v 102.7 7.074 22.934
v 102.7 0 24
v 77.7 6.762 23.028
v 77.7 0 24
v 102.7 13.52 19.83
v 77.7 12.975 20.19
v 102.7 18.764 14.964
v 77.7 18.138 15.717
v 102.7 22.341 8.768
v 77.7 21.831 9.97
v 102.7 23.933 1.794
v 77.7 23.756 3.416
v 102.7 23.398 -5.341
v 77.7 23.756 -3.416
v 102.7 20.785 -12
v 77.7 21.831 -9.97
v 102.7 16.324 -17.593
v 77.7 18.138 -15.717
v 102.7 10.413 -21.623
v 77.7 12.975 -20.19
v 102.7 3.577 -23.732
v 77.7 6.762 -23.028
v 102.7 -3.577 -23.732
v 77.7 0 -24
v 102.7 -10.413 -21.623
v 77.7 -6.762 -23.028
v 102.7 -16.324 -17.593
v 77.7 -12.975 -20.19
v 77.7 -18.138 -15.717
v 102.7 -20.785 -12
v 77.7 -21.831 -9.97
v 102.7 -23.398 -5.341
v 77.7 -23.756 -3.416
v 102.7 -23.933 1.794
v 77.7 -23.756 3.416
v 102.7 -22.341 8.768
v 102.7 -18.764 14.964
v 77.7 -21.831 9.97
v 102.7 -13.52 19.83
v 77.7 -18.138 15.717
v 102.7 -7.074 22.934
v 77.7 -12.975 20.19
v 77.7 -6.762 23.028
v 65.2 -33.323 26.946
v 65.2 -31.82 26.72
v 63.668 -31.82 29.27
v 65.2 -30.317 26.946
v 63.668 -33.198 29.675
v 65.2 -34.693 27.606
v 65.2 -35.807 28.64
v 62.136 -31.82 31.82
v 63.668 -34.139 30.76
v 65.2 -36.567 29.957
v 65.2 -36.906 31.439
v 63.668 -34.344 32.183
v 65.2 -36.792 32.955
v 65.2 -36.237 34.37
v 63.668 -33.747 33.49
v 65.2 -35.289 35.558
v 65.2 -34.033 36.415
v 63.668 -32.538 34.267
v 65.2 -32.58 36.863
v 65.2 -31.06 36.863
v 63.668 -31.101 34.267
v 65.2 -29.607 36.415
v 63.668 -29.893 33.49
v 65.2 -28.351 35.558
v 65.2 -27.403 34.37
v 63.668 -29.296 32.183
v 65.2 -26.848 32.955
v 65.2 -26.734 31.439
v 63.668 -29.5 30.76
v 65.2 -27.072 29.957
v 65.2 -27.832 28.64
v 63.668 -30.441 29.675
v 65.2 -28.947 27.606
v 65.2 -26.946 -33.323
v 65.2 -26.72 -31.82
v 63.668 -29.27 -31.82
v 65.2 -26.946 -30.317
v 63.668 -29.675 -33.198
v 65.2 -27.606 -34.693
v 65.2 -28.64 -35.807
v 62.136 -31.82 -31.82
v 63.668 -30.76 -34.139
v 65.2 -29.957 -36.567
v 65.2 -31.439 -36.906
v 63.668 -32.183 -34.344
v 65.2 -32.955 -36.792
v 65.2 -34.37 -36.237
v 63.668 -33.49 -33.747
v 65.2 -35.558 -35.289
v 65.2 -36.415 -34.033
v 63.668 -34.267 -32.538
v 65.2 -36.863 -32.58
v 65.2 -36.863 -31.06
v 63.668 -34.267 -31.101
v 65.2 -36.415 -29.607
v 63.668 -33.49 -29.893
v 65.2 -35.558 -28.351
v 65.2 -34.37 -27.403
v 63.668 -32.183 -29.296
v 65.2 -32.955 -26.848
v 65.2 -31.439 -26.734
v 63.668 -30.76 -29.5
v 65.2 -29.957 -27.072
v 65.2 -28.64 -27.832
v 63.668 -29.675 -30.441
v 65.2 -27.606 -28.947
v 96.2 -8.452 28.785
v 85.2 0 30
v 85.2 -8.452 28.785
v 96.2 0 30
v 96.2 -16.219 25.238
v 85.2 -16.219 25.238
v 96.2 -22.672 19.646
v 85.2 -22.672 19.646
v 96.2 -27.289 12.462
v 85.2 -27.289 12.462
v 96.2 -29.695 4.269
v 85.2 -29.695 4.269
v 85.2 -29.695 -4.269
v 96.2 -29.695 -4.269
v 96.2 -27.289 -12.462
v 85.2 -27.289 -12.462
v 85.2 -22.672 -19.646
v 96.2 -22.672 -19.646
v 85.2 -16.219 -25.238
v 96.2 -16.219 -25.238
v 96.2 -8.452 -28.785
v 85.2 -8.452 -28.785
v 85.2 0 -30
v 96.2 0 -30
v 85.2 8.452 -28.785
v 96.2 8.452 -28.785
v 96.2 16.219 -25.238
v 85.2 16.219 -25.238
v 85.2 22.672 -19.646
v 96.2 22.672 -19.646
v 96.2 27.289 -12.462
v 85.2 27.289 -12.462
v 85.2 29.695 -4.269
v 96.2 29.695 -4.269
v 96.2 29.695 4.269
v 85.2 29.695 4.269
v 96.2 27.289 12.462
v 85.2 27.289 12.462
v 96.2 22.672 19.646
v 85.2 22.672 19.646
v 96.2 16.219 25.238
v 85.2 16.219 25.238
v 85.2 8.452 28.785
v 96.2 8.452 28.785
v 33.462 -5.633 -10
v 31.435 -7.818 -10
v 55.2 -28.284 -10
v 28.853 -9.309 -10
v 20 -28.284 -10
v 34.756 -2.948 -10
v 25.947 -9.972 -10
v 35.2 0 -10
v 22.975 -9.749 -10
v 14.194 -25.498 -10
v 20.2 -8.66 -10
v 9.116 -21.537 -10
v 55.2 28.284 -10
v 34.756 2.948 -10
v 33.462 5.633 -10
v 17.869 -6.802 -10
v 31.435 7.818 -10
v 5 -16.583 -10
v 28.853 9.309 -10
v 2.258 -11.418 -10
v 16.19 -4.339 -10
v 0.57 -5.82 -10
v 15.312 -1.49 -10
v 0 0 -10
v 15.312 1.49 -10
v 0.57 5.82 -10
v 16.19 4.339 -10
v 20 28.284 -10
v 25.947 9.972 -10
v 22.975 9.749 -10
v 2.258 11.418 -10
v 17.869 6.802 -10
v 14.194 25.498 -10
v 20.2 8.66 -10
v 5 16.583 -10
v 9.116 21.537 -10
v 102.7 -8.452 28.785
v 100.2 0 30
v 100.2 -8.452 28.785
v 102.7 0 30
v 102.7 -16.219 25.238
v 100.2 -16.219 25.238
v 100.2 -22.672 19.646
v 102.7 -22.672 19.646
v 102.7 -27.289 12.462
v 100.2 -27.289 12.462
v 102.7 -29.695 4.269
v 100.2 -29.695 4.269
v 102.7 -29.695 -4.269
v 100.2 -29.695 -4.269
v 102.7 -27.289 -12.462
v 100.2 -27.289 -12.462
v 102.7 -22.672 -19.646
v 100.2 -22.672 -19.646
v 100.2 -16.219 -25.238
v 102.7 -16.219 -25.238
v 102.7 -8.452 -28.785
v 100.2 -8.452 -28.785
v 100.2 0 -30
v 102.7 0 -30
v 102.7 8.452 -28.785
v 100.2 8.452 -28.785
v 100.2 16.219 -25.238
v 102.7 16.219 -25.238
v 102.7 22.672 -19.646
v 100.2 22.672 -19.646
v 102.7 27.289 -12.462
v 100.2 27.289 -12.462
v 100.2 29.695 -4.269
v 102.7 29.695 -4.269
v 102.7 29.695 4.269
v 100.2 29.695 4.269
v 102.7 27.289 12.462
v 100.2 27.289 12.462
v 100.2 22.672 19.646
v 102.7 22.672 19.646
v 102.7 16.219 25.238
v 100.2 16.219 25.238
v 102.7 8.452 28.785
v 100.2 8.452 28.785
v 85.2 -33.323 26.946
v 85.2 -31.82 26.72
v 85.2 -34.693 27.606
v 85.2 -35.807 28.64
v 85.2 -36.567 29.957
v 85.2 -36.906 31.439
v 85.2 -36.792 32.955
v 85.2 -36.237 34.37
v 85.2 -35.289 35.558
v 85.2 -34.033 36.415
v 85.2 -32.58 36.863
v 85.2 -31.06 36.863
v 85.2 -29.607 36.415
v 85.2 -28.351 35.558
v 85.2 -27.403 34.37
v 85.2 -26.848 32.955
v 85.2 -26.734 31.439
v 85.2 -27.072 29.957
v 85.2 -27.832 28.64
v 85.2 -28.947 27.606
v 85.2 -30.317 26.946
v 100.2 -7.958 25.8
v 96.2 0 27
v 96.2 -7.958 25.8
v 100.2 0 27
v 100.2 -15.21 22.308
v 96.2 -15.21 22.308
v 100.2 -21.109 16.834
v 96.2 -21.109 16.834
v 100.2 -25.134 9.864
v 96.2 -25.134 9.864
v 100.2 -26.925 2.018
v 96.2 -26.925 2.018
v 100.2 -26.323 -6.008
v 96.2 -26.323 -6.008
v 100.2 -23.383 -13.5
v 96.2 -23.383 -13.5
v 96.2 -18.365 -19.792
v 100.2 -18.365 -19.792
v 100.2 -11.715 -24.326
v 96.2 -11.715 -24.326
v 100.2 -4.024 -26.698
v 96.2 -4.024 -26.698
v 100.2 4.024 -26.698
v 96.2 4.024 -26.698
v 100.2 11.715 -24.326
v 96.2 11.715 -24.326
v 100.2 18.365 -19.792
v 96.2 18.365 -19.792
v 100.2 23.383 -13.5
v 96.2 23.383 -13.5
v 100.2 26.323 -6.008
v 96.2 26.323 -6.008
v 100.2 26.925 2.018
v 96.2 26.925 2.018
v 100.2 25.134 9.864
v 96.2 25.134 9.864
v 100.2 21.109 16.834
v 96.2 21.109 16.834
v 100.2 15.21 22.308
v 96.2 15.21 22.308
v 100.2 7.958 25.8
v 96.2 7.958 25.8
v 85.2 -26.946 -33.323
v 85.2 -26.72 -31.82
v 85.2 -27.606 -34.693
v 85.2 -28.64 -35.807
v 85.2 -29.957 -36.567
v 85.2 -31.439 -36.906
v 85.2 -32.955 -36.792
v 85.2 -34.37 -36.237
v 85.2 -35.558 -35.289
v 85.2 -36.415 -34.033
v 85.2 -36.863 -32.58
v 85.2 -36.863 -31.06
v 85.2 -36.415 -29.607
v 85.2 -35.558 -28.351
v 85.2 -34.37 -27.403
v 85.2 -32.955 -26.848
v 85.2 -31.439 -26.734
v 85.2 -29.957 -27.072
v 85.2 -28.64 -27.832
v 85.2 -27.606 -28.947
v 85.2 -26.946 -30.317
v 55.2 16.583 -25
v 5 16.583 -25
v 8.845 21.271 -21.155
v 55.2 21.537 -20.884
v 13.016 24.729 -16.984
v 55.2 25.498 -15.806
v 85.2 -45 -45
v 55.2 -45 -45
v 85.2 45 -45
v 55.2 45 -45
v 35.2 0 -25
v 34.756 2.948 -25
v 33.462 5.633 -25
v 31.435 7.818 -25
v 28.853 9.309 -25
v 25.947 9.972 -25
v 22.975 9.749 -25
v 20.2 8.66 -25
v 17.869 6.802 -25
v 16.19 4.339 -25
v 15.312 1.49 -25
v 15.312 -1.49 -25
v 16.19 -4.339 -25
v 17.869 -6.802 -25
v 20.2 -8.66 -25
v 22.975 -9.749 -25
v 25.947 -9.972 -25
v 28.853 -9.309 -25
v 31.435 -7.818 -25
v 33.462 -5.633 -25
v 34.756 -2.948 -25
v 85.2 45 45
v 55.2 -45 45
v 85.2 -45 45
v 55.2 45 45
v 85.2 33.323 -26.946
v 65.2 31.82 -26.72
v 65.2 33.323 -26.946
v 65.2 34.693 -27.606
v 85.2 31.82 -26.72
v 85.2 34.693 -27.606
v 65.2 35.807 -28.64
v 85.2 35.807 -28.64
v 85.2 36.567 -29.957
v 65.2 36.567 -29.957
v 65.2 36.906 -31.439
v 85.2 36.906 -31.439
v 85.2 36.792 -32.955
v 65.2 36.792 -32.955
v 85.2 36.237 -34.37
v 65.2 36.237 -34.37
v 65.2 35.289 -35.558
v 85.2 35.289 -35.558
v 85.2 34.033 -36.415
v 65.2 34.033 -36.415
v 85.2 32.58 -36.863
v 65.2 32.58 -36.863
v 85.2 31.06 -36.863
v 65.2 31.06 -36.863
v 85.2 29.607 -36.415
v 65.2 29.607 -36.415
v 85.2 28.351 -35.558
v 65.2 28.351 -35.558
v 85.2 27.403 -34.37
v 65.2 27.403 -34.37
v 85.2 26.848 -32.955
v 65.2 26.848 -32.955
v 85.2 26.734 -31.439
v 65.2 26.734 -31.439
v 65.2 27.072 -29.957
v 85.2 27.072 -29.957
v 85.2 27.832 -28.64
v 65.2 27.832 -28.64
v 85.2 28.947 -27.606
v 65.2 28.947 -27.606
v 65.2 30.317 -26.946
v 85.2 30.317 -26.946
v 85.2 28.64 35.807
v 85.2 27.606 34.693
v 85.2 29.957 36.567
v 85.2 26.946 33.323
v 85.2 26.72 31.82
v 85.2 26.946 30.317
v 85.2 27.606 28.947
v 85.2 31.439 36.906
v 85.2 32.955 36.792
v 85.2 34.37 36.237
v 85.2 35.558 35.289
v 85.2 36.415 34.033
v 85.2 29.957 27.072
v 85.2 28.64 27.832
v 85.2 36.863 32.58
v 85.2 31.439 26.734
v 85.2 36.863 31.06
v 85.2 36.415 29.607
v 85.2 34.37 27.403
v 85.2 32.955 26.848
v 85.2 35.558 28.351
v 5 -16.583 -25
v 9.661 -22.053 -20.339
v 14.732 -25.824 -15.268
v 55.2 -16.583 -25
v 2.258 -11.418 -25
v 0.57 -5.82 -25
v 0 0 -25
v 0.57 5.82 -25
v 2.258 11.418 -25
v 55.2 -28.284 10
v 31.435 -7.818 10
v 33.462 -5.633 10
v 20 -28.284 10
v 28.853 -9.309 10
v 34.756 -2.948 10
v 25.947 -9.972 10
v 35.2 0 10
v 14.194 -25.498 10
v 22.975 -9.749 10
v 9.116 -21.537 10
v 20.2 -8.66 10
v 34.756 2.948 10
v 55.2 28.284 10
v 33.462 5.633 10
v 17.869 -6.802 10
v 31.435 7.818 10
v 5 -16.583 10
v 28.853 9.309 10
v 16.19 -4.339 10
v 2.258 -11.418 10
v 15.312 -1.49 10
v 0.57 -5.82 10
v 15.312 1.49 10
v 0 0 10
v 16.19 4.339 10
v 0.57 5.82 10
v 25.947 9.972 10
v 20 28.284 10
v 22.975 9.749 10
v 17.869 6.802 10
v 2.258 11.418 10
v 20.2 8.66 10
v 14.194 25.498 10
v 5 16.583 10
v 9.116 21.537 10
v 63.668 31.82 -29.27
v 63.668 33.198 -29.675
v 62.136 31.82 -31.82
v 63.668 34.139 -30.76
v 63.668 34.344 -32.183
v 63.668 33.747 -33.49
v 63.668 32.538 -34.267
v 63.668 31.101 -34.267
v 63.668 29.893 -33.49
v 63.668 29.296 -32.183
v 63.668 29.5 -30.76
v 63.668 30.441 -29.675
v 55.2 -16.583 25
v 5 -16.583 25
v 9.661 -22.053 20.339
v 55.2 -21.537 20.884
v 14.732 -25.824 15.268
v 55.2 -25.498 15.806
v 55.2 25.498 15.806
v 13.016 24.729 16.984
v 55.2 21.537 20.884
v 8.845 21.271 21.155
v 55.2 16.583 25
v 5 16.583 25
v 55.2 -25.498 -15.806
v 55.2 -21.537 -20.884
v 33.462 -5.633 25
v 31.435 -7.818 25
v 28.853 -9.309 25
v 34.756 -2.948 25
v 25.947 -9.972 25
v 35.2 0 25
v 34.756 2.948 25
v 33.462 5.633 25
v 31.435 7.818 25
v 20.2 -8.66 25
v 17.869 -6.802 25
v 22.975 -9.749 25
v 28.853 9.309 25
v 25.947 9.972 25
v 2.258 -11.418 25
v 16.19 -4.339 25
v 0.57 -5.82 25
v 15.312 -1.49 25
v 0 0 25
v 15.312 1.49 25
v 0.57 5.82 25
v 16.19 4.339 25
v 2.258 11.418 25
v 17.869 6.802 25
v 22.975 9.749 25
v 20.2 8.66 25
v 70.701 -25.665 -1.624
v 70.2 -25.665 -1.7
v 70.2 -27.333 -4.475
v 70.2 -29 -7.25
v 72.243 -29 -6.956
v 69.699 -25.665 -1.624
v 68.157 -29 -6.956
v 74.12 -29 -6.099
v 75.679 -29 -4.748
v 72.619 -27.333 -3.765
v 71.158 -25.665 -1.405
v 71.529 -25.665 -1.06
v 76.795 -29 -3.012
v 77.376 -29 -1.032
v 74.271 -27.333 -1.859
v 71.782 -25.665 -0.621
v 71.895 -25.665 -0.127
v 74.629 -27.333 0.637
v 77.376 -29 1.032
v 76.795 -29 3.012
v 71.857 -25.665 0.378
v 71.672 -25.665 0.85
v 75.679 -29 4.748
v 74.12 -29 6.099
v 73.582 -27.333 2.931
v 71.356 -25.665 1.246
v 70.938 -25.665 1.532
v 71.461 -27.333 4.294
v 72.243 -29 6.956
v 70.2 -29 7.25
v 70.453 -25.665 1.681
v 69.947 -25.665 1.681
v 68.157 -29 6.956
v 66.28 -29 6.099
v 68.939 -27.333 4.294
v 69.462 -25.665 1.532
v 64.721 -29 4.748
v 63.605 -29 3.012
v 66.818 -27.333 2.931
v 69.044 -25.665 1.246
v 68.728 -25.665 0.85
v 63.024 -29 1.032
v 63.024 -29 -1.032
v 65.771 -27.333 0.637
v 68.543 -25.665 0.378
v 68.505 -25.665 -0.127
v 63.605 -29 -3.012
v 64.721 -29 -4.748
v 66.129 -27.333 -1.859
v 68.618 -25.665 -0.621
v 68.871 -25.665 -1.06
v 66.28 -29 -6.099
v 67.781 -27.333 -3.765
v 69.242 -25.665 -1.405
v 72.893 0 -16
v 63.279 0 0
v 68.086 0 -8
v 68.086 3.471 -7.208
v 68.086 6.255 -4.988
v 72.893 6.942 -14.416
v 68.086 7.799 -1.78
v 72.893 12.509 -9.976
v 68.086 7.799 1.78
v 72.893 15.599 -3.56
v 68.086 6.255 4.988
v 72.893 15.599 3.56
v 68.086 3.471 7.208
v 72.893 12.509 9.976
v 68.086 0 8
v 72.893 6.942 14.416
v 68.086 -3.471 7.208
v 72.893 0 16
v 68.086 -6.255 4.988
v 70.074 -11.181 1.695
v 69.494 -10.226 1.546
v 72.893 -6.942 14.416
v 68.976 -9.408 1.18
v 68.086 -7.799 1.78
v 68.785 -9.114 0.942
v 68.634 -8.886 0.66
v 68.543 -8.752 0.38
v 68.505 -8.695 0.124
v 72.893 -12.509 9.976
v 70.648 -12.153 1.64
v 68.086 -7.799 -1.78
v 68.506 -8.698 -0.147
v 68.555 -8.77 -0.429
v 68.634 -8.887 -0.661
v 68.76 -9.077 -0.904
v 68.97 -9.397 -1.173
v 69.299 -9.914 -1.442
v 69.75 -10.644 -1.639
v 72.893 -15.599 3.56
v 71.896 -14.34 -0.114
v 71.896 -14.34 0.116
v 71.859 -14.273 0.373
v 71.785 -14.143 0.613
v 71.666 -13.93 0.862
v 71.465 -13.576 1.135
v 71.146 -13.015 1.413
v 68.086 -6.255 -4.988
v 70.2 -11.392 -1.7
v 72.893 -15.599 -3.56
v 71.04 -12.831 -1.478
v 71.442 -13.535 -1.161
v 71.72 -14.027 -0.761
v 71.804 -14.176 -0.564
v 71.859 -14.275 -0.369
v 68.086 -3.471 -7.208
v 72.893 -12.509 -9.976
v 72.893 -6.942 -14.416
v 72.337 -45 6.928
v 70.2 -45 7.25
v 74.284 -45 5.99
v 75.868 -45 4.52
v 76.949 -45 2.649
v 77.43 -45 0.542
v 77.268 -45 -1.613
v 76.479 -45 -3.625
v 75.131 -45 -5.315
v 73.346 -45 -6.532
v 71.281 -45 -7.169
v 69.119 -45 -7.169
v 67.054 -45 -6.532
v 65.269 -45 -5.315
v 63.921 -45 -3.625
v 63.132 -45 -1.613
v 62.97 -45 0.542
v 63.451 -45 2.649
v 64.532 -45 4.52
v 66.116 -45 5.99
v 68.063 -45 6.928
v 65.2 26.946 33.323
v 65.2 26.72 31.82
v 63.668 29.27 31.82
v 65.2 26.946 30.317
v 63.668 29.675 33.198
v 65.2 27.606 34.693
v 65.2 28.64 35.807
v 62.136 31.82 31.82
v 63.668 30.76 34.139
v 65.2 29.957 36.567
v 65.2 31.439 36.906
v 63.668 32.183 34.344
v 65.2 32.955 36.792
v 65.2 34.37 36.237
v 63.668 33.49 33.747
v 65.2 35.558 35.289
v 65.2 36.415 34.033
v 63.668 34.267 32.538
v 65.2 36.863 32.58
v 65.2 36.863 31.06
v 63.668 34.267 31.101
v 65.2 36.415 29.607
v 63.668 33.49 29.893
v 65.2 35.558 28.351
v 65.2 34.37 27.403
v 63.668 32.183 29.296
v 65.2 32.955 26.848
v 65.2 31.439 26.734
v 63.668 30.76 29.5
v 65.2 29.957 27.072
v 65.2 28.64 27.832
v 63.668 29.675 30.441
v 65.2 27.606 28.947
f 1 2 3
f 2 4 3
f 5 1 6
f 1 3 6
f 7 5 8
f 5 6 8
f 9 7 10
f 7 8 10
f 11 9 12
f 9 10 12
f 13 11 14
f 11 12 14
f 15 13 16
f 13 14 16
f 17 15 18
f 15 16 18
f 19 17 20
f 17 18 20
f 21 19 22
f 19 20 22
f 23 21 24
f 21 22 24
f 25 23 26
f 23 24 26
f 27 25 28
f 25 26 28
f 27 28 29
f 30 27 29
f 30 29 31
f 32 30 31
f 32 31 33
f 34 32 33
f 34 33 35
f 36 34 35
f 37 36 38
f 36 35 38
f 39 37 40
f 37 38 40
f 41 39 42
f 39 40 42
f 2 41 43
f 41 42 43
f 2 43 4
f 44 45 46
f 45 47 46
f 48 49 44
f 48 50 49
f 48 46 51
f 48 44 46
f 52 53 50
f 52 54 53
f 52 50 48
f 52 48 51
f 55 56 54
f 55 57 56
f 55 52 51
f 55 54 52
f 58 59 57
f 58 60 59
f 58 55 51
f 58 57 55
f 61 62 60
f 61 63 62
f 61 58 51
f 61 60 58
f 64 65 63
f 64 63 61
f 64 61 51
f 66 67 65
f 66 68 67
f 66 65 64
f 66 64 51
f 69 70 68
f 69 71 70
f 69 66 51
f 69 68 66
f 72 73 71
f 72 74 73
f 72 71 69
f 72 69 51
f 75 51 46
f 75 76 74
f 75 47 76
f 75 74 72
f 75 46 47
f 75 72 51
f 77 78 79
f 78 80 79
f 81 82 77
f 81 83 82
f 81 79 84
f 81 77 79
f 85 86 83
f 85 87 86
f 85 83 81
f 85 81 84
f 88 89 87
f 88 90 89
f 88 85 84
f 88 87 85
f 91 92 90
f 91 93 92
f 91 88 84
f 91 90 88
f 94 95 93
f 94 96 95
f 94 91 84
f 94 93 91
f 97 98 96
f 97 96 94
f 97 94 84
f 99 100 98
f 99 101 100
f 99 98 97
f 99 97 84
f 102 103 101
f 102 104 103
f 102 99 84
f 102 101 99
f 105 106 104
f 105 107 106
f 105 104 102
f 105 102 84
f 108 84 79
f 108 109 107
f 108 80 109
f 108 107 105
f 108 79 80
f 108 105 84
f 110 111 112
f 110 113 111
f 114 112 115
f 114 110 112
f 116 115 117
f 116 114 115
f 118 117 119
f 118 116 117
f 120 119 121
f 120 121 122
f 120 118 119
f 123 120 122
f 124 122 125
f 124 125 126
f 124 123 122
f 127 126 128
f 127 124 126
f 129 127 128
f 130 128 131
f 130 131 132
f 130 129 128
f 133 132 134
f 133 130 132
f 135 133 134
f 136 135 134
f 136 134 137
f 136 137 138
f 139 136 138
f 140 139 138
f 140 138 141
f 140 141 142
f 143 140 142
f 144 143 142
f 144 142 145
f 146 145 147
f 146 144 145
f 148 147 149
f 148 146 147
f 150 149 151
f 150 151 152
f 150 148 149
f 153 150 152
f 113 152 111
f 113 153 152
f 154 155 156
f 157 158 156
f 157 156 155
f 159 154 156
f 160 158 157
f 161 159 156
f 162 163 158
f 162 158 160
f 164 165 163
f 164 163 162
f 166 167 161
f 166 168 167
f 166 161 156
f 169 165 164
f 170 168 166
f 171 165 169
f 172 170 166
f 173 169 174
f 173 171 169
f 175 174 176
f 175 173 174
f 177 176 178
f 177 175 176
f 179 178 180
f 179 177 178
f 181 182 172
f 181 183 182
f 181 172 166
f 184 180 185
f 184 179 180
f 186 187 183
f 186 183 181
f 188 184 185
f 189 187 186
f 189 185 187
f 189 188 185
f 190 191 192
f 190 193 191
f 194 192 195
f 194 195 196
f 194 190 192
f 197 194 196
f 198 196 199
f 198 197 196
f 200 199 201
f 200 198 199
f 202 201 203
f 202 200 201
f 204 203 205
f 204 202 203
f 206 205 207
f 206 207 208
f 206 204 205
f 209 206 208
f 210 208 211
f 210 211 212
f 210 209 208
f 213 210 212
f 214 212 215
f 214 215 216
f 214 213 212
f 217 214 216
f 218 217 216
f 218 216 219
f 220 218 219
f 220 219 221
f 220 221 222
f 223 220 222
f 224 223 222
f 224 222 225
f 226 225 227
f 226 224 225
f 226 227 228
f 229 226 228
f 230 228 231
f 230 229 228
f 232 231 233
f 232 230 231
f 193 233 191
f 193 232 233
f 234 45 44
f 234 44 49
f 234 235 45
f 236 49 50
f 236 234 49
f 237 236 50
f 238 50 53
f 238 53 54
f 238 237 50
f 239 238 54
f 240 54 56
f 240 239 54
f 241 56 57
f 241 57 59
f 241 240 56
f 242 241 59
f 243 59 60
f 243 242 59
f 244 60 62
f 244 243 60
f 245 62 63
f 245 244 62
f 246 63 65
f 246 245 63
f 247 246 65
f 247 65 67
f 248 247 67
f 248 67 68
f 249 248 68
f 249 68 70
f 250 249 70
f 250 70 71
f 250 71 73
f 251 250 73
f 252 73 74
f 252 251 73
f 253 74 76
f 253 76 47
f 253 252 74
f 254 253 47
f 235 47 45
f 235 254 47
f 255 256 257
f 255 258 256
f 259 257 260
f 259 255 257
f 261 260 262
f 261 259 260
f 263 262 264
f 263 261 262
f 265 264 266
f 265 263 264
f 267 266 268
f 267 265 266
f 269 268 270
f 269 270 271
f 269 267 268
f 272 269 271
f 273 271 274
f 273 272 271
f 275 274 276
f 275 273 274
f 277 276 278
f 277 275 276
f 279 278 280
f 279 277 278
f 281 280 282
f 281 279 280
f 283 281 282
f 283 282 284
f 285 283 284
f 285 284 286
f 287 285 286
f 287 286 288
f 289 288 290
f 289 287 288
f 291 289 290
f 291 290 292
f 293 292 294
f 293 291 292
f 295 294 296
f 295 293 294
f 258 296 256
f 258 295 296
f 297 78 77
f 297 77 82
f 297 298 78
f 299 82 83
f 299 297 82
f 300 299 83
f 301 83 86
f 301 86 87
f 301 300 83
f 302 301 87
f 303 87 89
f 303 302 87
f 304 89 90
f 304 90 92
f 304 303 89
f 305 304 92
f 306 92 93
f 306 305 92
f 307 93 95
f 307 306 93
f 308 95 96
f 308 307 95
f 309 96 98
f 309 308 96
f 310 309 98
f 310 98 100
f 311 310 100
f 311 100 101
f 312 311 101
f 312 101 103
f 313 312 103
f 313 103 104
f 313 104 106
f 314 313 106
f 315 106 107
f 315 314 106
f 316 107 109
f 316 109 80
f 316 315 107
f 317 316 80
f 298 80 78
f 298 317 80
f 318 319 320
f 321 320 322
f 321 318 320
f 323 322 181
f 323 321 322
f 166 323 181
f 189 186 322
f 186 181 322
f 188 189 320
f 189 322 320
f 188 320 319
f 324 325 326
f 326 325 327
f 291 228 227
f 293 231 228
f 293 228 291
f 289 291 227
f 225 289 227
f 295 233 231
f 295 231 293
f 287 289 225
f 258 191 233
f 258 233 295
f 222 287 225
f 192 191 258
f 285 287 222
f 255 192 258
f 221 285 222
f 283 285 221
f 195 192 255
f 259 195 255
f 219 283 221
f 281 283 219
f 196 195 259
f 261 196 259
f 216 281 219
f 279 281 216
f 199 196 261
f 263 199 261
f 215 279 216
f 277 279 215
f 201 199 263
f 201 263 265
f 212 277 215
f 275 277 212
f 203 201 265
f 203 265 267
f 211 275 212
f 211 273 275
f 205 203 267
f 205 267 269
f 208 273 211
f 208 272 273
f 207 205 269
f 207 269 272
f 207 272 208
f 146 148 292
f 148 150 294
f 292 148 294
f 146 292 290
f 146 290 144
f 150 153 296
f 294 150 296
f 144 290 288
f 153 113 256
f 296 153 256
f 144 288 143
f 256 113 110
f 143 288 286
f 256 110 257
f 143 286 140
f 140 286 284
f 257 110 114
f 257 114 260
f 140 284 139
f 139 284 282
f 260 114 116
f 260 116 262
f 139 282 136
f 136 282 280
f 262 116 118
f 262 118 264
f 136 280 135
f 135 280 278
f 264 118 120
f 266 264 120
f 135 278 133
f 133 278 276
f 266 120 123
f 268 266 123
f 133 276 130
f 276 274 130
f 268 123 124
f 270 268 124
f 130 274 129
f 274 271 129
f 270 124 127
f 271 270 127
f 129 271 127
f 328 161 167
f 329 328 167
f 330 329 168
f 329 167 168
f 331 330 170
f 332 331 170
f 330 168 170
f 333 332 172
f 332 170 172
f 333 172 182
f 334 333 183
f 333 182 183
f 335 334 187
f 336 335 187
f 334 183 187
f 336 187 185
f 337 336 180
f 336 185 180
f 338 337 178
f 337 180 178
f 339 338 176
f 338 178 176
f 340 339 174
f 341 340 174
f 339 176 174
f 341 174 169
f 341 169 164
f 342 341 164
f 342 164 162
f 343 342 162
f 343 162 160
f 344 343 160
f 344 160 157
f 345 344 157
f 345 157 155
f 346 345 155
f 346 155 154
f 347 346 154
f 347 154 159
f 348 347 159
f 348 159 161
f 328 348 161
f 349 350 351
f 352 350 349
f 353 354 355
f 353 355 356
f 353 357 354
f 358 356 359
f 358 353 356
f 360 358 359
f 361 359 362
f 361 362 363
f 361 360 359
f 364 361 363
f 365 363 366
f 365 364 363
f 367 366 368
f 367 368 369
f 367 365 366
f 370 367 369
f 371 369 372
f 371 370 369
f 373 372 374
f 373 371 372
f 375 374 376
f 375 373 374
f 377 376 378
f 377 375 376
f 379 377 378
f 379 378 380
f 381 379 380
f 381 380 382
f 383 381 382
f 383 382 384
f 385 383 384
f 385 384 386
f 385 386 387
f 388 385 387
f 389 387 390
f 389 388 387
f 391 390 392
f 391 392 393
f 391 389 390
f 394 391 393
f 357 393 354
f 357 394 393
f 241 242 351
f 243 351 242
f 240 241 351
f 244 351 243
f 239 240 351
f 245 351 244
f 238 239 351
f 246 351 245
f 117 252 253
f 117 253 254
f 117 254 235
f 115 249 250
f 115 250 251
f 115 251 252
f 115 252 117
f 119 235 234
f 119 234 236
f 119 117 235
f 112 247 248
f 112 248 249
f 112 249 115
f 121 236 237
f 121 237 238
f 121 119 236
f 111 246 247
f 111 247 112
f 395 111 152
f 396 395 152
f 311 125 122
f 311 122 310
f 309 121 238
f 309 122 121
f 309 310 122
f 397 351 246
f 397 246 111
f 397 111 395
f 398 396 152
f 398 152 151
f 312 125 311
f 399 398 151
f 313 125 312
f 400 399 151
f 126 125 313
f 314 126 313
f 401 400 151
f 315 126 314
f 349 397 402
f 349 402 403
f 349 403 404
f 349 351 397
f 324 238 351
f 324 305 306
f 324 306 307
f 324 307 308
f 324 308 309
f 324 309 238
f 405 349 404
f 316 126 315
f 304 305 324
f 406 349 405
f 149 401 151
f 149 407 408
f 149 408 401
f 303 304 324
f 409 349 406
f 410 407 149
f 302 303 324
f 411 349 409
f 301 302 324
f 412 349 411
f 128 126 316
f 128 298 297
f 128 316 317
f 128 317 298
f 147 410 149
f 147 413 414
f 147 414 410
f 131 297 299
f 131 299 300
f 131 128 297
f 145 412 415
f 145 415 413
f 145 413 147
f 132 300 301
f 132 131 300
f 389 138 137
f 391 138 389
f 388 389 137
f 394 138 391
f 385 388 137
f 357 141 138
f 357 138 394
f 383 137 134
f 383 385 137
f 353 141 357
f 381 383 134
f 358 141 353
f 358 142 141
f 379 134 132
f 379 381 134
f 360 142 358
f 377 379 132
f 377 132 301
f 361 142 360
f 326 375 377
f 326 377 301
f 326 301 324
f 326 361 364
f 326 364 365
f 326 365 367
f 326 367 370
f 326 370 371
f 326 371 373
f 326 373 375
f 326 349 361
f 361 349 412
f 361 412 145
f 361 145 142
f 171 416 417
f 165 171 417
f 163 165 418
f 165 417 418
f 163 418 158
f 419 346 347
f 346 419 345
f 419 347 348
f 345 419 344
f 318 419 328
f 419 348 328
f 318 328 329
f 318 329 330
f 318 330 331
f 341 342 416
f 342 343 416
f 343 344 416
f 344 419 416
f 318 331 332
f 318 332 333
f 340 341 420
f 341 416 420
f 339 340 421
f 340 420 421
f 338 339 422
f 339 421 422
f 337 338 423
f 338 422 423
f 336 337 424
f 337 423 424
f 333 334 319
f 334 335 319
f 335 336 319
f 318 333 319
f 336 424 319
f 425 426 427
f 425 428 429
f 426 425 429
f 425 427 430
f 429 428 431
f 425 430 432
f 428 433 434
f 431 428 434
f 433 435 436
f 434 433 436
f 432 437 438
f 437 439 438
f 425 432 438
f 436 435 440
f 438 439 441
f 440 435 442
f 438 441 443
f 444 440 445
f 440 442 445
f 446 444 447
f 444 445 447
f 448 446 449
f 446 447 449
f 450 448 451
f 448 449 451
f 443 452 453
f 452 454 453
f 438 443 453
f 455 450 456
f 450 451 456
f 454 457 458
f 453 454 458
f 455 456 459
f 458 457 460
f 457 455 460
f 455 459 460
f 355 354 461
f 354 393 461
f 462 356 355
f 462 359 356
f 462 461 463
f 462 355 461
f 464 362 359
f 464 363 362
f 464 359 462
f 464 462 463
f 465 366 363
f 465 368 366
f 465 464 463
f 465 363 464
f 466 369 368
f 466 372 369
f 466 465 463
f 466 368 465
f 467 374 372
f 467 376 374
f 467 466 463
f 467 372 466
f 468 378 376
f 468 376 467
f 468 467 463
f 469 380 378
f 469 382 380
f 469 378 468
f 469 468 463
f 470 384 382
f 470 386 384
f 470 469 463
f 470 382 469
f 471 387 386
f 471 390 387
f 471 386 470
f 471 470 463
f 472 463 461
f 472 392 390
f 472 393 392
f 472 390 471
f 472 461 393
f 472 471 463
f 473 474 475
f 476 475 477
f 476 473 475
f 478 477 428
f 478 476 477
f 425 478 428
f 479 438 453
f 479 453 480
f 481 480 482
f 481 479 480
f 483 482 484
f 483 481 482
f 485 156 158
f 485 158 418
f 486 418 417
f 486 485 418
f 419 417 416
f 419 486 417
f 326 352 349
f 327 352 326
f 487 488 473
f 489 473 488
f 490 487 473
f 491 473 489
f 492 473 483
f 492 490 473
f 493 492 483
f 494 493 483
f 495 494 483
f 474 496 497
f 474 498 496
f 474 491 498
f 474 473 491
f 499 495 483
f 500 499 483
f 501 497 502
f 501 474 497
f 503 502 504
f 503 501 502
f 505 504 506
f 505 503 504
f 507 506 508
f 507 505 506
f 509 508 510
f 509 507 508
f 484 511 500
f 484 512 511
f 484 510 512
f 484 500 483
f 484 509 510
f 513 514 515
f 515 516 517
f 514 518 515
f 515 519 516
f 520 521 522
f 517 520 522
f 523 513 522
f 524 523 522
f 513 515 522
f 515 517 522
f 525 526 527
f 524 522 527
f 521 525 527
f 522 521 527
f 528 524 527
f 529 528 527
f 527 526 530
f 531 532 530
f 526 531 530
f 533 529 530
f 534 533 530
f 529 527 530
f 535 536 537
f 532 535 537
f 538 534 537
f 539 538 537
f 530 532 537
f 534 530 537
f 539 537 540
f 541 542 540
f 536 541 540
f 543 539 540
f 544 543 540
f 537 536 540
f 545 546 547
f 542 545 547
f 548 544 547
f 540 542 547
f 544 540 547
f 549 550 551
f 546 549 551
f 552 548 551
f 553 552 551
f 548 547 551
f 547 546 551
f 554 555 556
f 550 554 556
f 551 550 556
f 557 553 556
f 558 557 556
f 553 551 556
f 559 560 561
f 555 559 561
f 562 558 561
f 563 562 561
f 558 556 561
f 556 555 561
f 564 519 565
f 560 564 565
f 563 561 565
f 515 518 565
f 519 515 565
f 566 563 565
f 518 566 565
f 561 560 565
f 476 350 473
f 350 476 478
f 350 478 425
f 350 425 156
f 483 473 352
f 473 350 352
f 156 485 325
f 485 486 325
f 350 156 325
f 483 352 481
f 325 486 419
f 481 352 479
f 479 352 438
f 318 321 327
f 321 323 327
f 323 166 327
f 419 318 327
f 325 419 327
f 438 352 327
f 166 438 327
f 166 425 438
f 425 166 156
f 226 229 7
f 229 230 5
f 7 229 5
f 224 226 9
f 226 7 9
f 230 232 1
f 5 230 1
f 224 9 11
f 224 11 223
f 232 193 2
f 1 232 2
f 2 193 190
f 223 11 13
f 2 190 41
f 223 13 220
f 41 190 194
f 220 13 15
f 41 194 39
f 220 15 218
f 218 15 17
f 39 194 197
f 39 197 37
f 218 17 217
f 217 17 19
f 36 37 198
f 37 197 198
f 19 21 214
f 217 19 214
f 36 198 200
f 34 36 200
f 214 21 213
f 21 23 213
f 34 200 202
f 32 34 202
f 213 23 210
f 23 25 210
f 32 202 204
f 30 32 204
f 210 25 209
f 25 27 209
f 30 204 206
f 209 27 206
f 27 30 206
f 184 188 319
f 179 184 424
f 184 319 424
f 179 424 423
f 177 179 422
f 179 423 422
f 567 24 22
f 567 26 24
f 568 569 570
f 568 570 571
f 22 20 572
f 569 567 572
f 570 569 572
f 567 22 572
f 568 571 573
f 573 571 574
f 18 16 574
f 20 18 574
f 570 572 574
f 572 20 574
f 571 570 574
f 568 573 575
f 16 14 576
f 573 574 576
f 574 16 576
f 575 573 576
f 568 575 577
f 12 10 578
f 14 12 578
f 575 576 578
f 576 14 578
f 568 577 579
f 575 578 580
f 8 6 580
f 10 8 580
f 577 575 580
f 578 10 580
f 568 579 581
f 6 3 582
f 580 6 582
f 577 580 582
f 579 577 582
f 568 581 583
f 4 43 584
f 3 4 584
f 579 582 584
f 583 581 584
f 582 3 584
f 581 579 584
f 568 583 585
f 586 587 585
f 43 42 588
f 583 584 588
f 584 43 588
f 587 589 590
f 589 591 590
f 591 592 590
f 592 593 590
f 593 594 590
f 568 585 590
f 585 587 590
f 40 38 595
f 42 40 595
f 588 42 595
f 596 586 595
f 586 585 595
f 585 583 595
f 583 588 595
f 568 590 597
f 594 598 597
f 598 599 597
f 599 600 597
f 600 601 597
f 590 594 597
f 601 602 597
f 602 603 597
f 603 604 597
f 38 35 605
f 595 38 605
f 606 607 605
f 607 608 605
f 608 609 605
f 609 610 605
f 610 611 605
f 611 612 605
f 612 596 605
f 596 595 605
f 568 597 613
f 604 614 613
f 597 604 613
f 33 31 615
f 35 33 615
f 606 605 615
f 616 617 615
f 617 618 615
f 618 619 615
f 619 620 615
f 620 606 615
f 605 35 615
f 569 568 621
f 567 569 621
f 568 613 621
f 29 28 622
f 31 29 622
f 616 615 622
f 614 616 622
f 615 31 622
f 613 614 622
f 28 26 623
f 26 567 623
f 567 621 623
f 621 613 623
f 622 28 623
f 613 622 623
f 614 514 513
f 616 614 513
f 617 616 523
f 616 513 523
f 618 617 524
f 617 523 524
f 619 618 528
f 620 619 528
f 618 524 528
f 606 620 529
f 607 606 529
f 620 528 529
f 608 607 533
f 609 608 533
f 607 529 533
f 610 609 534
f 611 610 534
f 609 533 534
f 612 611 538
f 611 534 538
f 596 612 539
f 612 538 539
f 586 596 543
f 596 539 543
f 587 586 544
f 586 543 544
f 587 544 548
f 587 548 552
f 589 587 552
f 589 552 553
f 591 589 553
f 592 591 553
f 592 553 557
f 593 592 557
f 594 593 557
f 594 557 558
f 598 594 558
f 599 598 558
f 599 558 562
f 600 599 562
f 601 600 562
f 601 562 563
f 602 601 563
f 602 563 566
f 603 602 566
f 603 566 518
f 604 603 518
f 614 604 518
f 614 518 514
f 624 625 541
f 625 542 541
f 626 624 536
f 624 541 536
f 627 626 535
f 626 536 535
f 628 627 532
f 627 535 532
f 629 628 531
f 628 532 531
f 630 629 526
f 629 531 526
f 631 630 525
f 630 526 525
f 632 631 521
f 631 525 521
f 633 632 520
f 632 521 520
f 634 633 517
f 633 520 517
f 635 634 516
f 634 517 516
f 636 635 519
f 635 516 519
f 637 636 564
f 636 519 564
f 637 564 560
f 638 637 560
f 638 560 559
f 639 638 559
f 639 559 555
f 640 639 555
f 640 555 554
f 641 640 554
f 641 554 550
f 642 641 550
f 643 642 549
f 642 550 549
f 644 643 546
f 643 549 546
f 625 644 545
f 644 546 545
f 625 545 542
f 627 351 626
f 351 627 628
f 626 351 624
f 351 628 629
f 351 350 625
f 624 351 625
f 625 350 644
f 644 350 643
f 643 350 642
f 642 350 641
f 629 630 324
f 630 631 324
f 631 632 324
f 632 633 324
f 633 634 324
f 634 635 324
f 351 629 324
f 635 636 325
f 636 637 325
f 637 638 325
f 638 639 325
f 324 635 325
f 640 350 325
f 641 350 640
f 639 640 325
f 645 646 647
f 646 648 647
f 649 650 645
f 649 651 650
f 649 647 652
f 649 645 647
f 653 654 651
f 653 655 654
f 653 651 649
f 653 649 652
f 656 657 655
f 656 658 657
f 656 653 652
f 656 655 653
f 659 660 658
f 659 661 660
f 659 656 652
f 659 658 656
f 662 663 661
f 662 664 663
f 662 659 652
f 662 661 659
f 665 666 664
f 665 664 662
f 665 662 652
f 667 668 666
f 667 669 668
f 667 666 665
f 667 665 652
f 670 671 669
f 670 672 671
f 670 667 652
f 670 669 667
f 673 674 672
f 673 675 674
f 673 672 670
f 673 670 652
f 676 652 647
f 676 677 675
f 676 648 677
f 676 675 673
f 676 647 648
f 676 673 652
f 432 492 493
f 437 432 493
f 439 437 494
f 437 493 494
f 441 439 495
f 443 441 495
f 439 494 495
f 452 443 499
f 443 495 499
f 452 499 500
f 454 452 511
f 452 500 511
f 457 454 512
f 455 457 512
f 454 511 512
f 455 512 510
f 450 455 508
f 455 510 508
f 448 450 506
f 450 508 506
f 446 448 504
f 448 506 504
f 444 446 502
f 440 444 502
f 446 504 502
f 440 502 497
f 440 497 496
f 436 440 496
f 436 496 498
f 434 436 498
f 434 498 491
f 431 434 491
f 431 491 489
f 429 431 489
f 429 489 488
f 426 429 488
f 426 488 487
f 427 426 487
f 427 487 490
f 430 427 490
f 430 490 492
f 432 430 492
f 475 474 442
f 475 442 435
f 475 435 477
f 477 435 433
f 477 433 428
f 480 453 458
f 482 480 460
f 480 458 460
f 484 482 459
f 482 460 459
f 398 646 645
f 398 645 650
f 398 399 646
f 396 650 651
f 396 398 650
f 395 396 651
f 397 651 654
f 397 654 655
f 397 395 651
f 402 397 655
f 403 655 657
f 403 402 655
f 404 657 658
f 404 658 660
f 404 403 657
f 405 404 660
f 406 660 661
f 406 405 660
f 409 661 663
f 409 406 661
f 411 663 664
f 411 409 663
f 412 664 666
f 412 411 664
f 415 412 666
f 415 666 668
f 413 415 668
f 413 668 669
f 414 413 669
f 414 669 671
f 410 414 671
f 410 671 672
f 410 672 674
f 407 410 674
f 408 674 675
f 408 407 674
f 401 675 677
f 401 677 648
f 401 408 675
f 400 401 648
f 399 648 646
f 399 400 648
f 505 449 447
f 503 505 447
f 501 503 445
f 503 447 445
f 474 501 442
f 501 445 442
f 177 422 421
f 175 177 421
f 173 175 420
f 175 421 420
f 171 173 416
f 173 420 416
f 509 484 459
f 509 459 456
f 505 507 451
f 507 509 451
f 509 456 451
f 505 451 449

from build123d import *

# Parameters (mm, degrees)
SKETCH1_W                          = 55.2
SKETCH1_H                          = 30
SKETCH2_W                          = 90
SKETCH2_H                          = 90
BOSS_EXTRUDE1_DEPTH                = 30
SKETCH8_W                          = 96.2
SKETCH8_H                          = 30
SKETCH11_W                         = 100.2
SKETCH11_H                         = 27
SKETCH15_W                         = 2.5
SKETCH15_H                         = 30
SKETCH16_W                         = 20
SKETCH16_H                         = 71.644187242
CUT_EXTRUDE1_DEPTH                 = 55.2
SKETCH17_OUTSIDE_W                 = 124.71
SKETCH17_OUTSIDE_H                 = 124.71
SKETCH17_OUTSIDE_W_2               = 50
SKETCH17_OUTSIDE_H_2               = 73.870600334
CUT_EXTRUDE2_DEPTH                 = 55.2
SKETCH19_R                         = 10
CUT_EXTRUDE3_DEPTH                 = 133.182790105
CUT_EXTRUDE4_DEPTH                 = 133.182790105
TAP_DRILL_FOR_M1_2X0_25_TAP2_D     = 48
TAP_DRILL_FOR_M1_2X0_25_TAP2_DEPTH = 25
TAP_DRILL_FOR_M1_2X0_25_TAP2_TIP   = 14.420654857
CIRPATTERN1_COUNT                  = 4
M16X1_5_TAPPED_HOLE3_D             = 14.5
M16X1_5_TAPPED_HOLE3_DEPTH         = 16
M16X1_5_TAPPED_HOLE3_TIP           = 4.356239488
CUT_EXTRUDE5_REACH                 = 145.779
SKETCH45_R                         = 1.7


with BuildPart() as part:
    # Sketch1 → Revolve-Thin1 (revolve)
    with BuildSketch(Plane.XY, mode=Mode.PRIVATE) as revolve_thin1_sk:
        with Locations((27.6, 15)):
            Rectangle(SKETCH1_W, SKETCH1_H)
    revolve(revolve_thin1_sk.sketch.rotate(Axis((0, 0, 0), (1, 0, 0)), 90), axis=Axis((0, 0, 0), (1, 0, 0)))

    # Sketch2 → Boss-Extrude1 (add)
    with BuildSketch(Plane(origin=(55.2, 0, 0), x_dir=(0, 0, -1), z_dir=(1, 0, 0))):
        Rectangle(SKETCH2_W, SKETCH2_H)
    extrude(amount=BOSS_EXTRUDE1_DEPTH)

    # Sketch8 → Revolve-Thin2 (revolve)
    with BuildSketch(Plane.XY, mode=Mode.PRIVATE) as revolve_thin2_sk:
        with Locations((48.1, 15)):
            Rectangle(SKETCH8_W, SKETCH8_H)
    revolve(revolve_thin2_sk.sketch.rotate(Axis((0, 0, 0), (1, 0, 0)), 90), axis=Axis((0, 0, 0), (1, 0, 0)))

    # Sketch11 → Revolve-Thin3 (revolve)
    with BuildSketch(Plane(origin=(0, 0, 0), x_dir=(1, 0, 0), z_dir=(0, 1, 0)), mode=Mode.PRIVATE) as revolve_thin3_sk:
        with Locations((50.1, 13.5)):
            Rectangle(SKETCH11_W, SKETCH11_H)
    revolve(revolve_thin3_sk.sketch.rotate(Axis((0, 0, 0), (1, 0, 0)), 180), axis=Axis((0, 0, 0), (1, 0, 0)))

    # Sketch15 → Revolve-Thin4 (revolve)
    with BuildSketch(Plane.XY, mode=Mode.PRIVATE) as revolve_thin4_sk:
        with Locations((101.45, 15)):
            Rectangle(SKETCH15_W, SKETCH15_H)
    revolve(revolve_thin4_sk.sketch.rotate(Axis((100.2, 0, 0), (1, 0, 0)), 90), axis=Axis((100.2, 0, 0), (1, 0, 0)))

    # Sketch16 → Cut-Extrude1 (cut)
    with BuildSketch(Plane.ZY):
        Rectangle(SKETCH16_W, SKETCH16_H)
    extrude(amount=-CUT_EXTRUDE1_DEPTH, mode=Mode.SUBTRACT)

    # Sketch17 outside → Cut-Extrude2 (cut)
    with BuildSketch(Plane.ZY):
        Rectangle(SKETCH17_OUTSIDE_W, SKETCH17_OUTSIDE_H)
        Rectangle(SKETCH17_OUTSIDE_W_2, SKETCH17_OUTSIDE_H_2, mode=Mode.SUBTRACT)
    extrude(amount=-CUT_EXTRUDE2_DEPTH, mode=Mode.SUBTRACT)

    # Sketch19 → Cut-Extrude3 (cut, through all)
    with BuildSketch(Plane.XY.offset(25)):
        with Locations((25.2, 0)):
            Circle(SKETCH19_R)
    extrude(amount=-CUT_EXTRUDE3_DEPTH, mode=Mode.SUBTRACT)

    # Sketch22 → Cut-Extrude4 (cut, through all)
    with BuildSketch(Plane(origin=(0, 0, -25), x_dir=(-1, 0, 0), z_dir=(0, 0, -1))):
        with BuildLine():
            Line((0, 16.583123952), (-5, 16.583123952))
            ThreePointArc((-5, 16.583123952), (-1.277186767, 8.660254038), (0, 0))
            Line((0, 0), (0, 16.583123952))
        make_face()
        with BuildLine():
            Line((9.98487255, 34.360502565), (-23.649851102, 34.360502565))
            Line((-23.649851102, 34.360502565), (-23.649851102, 29.320225254))
            ThreePointArc((-23.649851102, 29.320225254), (-13.080591134, 24.773647362), (-5, 16.583123952))
            Line((-5, 16.583123952), (0, 16.583123952))
            Line((0, 16.583123952), (0, 0))
            Line((0, 0), (0, -16.583123952))
            Line((0, -16.583123952), (-5, -16.583123952))
            ThreePointArc((-5, -16.583123952), (-13.080591134, -24.773647362), (-23.649851102, -29.320225254))
            Line((-23.649851102, -29.320225254), (-23.649851102, -35.668103598))
            Line((-23.649851102, -35.668103598), (9.98487255, -35.668103598))
            Line((9.98487255, -35.668103598), (9.98487255, 34.360502565))
        make_face()
        with BuildLine():
            Line((0, -16.583123952), (0, 0))
            ThreePointArc((0, 0), (-1.277186767, -8.660254038), (-5, -16.583123952))
            Line((-5, -16.583123952), (0, -16.583123952))
        make_face()
    extrude(amount=-CUT_EXTRUDE4_DEPTH, mode=Mode.SUBTRACT)

    # Tap Drill for M1.2x0.25 Tap2
    with Locations(Plane(origin=(102.7, 0, 0), x_dir=(0, 0, -1), z_dir=(1, 0, 0))):
        with Locations((0, 0)):
            Hole(TAP_DRILL_FOR_M1_2X0_25_TAP2_D / 2, depth=TAP_DRILL_FOR_M1_2X0_25_TAP2_DEPTH)
            with Locations((0, 0, -(TAP_DRILL_FOR_M1_2X0_25_TAP2_DEPTH + TAP_DRILL_FOR_M1_2X0_25_TAP2_TIP / 2))):  # 118° drill point
                Cone(0, TAP_DRILL_FOR_M1_2X0_25_TAP2_D / 2, TAP_DRILL_FOR_M1_2X0_25_TAP2_TIP, mode=Mode.SUBTRACT)

    # Sketch32 → M12 Tapped Hole2 (revolve, cut)
    with BuildSketch(Plane(origin=(85.2, -31.819805153, 31.819805153), x_dir=(0, 0, -1), z_dir=(0, 1, 0))):
        Polygon((0, 0), (0, 23.064389157), (5.1, 20), (5.1, 0), align=None)
    m12_tapped_hole2 = revolve(axis=Axis((91.55, -31.819805153, 31.819805153), (-1, 0, 0)), mode=Mode.SUBTRACT)

    # CirPattern1: M12 Tapped Hole2 ×4 about axis
    cirpattern1_axis = Axis((0, 0, 0), (1, 0, 0))
    for i in range(1, CIRPATTERN1_COUNT):
        add(m12_tapped_hole2.rotate(cirpattern1_axis, i * 360 / CIRPATTERN1_COUNT), mode=Mode.SUBTRACT)

    # M16x1.5 Tapped Hole3
    with Locations(Plane(origin=(70.2, -45, 0), x_dir=(0, 0, -1), z_dir=(0, -1, 0))):
        with Locations((0, 0)):
            Hole(M16X1_5_TAPPED_HOLE3_D / 2, depth=M16X1_5_TAPPED_HOLE3_DEPTH)
            with Locations((0, 0, -(M16X1_5_TAPPED_HOLE3_DEPTH + M16X1_5_TAPPED_HOLE3_TIP / 2))):  # 118° drill point
                Cone(0, M16X1_5_TAPPED_HOLE3_D / 2, M16X1_5_TAPPED_HOLE3_TIP, mode=Mode.SUBTRACT)

    # Cut-Extrude5: up to this cone (the profile starts outside it)
    cut_extrude5_end = Plane(origin=(70.2, 0, 0), z_dir=(1, 0, 0)).offset(-6.920653857) * Cone(1.664e-06, 274.136053392, 164.717557739, align=(Align.CENTER, Align.CENTER, Align.MIN), mode=Mode.PRIVATE)
    # Sketch45 → Cut-Extrude5 (cut, up to the surface)
    with BuildSketch(Plane.XZ.offset(45), mode=Mode.PRIVATE) as cut_extrude5_sk1:
        with Locations(Location((70.2, 0, 0), (0, 0, 270))):
            Circle(SKETCH45_R)
    cut_extrude5_tool1 = extrude(cut_extrude5_sk1.sketch, amount=-CUT_EXTRUDE5_REACH, mode=Mode.PRIVATE) - cut_extrude5_end
    add(cut_extrude5_tool1.solids().sort_by_distance((70.2, -45, 0))[0], mode=Mode.SUBTRACT)


solid = part.part
